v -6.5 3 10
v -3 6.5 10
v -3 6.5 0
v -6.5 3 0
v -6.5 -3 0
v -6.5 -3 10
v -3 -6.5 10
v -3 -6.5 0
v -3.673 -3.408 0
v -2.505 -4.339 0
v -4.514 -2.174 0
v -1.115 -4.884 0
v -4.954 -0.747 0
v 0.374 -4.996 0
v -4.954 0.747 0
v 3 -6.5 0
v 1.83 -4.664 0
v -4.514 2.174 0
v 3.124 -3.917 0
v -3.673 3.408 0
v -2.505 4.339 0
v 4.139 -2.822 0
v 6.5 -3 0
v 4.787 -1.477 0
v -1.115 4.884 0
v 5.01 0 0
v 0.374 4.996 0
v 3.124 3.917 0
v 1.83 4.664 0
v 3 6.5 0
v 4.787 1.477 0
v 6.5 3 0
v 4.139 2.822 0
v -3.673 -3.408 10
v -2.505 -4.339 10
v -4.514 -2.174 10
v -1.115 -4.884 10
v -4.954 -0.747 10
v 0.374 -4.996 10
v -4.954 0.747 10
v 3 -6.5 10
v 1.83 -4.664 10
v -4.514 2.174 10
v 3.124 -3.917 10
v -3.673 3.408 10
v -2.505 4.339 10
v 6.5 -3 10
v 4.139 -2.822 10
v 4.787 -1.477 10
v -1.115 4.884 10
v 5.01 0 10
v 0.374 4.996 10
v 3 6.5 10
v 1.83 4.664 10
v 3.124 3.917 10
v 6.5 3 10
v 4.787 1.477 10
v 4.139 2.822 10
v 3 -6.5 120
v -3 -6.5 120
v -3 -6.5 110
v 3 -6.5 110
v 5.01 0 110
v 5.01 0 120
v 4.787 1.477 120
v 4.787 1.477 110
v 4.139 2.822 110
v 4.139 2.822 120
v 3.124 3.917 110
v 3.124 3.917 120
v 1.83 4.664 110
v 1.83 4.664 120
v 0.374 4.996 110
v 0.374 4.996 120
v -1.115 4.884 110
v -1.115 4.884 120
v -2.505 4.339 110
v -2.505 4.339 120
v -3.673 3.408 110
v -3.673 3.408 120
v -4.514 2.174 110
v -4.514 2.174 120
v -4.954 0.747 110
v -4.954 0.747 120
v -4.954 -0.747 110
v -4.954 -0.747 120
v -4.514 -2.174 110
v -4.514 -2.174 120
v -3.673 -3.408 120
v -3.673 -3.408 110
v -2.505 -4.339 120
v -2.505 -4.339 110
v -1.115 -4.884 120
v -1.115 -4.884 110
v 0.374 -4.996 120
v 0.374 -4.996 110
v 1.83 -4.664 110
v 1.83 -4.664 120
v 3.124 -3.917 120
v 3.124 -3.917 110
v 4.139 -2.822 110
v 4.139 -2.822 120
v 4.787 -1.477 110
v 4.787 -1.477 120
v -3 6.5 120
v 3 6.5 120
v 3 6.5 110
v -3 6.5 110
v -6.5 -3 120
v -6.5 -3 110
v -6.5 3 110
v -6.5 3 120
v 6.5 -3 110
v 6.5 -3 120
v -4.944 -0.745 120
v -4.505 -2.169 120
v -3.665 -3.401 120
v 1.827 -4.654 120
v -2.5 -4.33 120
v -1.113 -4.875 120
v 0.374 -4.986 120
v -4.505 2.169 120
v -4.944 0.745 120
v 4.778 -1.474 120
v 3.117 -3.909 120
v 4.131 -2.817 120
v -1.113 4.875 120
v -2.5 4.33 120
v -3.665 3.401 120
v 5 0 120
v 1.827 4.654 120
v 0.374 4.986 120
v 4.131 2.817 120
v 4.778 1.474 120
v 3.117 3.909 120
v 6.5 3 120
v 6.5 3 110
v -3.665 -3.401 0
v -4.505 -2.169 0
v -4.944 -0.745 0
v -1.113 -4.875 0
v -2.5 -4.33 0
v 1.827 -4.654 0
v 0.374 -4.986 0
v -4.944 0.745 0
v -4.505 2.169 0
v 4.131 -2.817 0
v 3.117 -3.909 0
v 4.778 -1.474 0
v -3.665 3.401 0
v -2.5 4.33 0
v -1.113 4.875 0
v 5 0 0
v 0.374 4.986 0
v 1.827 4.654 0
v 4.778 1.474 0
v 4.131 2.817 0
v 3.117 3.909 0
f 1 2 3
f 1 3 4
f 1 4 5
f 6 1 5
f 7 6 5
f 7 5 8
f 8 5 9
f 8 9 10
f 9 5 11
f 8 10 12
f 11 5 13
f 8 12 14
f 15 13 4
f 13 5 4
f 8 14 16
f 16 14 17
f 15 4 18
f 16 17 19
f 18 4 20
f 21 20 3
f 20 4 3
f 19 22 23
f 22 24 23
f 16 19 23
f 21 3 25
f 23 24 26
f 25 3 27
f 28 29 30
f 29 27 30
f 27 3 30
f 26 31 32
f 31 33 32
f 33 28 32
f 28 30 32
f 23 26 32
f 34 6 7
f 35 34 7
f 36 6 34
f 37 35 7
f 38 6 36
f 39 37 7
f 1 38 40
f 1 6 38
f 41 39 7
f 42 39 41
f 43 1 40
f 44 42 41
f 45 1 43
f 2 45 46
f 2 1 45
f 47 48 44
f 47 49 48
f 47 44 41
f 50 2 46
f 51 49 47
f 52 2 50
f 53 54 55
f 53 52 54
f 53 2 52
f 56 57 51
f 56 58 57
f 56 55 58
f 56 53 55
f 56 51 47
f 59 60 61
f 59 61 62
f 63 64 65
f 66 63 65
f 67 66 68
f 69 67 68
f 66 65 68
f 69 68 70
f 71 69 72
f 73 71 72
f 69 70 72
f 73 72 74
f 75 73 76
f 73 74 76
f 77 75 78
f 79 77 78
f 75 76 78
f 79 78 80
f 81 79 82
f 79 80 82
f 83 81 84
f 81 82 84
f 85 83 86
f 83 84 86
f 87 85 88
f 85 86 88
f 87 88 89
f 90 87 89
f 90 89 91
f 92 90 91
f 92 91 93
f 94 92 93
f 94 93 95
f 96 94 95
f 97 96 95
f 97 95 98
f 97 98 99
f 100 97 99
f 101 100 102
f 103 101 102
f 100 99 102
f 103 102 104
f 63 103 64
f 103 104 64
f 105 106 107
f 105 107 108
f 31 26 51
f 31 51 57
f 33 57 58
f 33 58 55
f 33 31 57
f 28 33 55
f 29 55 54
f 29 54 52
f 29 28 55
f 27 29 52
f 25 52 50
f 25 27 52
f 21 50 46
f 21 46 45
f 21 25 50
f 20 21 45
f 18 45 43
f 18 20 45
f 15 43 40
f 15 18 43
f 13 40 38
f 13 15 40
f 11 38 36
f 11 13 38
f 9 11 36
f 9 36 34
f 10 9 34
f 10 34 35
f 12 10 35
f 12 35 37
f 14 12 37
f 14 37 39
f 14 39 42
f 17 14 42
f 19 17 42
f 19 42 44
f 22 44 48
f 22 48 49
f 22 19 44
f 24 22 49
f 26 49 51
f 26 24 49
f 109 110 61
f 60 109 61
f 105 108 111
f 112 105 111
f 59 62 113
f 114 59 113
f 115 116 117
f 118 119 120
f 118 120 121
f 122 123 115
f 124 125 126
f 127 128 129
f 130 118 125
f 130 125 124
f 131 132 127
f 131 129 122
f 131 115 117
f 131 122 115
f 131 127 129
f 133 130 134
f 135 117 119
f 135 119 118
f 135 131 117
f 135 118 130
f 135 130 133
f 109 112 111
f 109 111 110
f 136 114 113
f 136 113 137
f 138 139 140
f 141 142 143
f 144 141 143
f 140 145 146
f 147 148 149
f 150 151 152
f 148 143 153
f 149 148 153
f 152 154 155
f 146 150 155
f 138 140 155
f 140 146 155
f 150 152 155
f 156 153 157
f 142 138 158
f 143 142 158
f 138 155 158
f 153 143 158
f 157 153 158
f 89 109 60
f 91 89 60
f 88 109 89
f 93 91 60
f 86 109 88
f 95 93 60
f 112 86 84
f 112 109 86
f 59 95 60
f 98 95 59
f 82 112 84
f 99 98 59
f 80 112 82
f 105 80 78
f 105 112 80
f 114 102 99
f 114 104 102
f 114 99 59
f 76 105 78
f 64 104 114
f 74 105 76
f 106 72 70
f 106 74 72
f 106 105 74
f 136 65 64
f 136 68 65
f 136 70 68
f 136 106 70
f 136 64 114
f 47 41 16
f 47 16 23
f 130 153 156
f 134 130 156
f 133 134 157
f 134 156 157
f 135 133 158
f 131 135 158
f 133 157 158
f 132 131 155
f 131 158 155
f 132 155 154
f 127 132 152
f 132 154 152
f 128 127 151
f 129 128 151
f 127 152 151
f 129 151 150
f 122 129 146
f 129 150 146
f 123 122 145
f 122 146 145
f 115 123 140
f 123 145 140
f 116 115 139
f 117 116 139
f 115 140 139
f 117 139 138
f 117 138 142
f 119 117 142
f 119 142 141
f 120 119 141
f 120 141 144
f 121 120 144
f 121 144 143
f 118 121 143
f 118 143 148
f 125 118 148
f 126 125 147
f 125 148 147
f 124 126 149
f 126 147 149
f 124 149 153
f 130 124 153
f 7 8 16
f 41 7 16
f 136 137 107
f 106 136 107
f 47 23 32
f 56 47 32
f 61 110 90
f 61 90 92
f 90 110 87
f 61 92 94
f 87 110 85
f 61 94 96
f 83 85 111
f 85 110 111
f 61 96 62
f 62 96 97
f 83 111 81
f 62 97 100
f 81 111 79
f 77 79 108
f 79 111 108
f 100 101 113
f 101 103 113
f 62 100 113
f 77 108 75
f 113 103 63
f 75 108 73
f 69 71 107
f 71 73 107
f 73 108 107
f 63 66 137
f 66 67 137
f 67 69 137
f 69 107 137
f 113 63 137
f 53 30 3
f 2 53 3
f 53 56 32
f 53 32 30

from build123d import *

# Parameters (mm, degrees)
SKETCH1_R           = 5
BOSS_EXTRUDE1_DEPTH = 120
SKETCH2_R           = 5.01
BOSS_EXTRUDE2_DEPTH = 10


with BuildPart() as part:
    # Sketch1 → Boss-Extrude1 (new body)
    with BuildSketch(Plane.XY):
        Circle(SKETCH1_R)
    extrude(amount=BOSS_EXTRUDE1_DEPTH)


with BuildPart() as body_2:
    # Sketch2 → Boss-Extrude2 (new body)
    with BuildSketch(Plane.XY.offset(120)):
        Polygon((3, 6.5), (-3, 6.5), (-6.5, 3), (-6.5, -3), (-3, -6.5), (3, -6.5), (6.5, -3), (6.5, 3), align=None)
        Circle(SKETCH2_R, mode=Mode.SUBTRACT)
    extrude(amount=-BOSS_EXTRUDE2_DEPTH)


with BuildPart() as body_3:
    # Mirror1: mirrored copy
    add(body_2.part.mirror(Plane(origin=(0, 0, 60), x_dir=(1, 0, 0), z_dir=(0, 0, -1))))


solid = Compound([part.part, body_2.part, body_3.part])
